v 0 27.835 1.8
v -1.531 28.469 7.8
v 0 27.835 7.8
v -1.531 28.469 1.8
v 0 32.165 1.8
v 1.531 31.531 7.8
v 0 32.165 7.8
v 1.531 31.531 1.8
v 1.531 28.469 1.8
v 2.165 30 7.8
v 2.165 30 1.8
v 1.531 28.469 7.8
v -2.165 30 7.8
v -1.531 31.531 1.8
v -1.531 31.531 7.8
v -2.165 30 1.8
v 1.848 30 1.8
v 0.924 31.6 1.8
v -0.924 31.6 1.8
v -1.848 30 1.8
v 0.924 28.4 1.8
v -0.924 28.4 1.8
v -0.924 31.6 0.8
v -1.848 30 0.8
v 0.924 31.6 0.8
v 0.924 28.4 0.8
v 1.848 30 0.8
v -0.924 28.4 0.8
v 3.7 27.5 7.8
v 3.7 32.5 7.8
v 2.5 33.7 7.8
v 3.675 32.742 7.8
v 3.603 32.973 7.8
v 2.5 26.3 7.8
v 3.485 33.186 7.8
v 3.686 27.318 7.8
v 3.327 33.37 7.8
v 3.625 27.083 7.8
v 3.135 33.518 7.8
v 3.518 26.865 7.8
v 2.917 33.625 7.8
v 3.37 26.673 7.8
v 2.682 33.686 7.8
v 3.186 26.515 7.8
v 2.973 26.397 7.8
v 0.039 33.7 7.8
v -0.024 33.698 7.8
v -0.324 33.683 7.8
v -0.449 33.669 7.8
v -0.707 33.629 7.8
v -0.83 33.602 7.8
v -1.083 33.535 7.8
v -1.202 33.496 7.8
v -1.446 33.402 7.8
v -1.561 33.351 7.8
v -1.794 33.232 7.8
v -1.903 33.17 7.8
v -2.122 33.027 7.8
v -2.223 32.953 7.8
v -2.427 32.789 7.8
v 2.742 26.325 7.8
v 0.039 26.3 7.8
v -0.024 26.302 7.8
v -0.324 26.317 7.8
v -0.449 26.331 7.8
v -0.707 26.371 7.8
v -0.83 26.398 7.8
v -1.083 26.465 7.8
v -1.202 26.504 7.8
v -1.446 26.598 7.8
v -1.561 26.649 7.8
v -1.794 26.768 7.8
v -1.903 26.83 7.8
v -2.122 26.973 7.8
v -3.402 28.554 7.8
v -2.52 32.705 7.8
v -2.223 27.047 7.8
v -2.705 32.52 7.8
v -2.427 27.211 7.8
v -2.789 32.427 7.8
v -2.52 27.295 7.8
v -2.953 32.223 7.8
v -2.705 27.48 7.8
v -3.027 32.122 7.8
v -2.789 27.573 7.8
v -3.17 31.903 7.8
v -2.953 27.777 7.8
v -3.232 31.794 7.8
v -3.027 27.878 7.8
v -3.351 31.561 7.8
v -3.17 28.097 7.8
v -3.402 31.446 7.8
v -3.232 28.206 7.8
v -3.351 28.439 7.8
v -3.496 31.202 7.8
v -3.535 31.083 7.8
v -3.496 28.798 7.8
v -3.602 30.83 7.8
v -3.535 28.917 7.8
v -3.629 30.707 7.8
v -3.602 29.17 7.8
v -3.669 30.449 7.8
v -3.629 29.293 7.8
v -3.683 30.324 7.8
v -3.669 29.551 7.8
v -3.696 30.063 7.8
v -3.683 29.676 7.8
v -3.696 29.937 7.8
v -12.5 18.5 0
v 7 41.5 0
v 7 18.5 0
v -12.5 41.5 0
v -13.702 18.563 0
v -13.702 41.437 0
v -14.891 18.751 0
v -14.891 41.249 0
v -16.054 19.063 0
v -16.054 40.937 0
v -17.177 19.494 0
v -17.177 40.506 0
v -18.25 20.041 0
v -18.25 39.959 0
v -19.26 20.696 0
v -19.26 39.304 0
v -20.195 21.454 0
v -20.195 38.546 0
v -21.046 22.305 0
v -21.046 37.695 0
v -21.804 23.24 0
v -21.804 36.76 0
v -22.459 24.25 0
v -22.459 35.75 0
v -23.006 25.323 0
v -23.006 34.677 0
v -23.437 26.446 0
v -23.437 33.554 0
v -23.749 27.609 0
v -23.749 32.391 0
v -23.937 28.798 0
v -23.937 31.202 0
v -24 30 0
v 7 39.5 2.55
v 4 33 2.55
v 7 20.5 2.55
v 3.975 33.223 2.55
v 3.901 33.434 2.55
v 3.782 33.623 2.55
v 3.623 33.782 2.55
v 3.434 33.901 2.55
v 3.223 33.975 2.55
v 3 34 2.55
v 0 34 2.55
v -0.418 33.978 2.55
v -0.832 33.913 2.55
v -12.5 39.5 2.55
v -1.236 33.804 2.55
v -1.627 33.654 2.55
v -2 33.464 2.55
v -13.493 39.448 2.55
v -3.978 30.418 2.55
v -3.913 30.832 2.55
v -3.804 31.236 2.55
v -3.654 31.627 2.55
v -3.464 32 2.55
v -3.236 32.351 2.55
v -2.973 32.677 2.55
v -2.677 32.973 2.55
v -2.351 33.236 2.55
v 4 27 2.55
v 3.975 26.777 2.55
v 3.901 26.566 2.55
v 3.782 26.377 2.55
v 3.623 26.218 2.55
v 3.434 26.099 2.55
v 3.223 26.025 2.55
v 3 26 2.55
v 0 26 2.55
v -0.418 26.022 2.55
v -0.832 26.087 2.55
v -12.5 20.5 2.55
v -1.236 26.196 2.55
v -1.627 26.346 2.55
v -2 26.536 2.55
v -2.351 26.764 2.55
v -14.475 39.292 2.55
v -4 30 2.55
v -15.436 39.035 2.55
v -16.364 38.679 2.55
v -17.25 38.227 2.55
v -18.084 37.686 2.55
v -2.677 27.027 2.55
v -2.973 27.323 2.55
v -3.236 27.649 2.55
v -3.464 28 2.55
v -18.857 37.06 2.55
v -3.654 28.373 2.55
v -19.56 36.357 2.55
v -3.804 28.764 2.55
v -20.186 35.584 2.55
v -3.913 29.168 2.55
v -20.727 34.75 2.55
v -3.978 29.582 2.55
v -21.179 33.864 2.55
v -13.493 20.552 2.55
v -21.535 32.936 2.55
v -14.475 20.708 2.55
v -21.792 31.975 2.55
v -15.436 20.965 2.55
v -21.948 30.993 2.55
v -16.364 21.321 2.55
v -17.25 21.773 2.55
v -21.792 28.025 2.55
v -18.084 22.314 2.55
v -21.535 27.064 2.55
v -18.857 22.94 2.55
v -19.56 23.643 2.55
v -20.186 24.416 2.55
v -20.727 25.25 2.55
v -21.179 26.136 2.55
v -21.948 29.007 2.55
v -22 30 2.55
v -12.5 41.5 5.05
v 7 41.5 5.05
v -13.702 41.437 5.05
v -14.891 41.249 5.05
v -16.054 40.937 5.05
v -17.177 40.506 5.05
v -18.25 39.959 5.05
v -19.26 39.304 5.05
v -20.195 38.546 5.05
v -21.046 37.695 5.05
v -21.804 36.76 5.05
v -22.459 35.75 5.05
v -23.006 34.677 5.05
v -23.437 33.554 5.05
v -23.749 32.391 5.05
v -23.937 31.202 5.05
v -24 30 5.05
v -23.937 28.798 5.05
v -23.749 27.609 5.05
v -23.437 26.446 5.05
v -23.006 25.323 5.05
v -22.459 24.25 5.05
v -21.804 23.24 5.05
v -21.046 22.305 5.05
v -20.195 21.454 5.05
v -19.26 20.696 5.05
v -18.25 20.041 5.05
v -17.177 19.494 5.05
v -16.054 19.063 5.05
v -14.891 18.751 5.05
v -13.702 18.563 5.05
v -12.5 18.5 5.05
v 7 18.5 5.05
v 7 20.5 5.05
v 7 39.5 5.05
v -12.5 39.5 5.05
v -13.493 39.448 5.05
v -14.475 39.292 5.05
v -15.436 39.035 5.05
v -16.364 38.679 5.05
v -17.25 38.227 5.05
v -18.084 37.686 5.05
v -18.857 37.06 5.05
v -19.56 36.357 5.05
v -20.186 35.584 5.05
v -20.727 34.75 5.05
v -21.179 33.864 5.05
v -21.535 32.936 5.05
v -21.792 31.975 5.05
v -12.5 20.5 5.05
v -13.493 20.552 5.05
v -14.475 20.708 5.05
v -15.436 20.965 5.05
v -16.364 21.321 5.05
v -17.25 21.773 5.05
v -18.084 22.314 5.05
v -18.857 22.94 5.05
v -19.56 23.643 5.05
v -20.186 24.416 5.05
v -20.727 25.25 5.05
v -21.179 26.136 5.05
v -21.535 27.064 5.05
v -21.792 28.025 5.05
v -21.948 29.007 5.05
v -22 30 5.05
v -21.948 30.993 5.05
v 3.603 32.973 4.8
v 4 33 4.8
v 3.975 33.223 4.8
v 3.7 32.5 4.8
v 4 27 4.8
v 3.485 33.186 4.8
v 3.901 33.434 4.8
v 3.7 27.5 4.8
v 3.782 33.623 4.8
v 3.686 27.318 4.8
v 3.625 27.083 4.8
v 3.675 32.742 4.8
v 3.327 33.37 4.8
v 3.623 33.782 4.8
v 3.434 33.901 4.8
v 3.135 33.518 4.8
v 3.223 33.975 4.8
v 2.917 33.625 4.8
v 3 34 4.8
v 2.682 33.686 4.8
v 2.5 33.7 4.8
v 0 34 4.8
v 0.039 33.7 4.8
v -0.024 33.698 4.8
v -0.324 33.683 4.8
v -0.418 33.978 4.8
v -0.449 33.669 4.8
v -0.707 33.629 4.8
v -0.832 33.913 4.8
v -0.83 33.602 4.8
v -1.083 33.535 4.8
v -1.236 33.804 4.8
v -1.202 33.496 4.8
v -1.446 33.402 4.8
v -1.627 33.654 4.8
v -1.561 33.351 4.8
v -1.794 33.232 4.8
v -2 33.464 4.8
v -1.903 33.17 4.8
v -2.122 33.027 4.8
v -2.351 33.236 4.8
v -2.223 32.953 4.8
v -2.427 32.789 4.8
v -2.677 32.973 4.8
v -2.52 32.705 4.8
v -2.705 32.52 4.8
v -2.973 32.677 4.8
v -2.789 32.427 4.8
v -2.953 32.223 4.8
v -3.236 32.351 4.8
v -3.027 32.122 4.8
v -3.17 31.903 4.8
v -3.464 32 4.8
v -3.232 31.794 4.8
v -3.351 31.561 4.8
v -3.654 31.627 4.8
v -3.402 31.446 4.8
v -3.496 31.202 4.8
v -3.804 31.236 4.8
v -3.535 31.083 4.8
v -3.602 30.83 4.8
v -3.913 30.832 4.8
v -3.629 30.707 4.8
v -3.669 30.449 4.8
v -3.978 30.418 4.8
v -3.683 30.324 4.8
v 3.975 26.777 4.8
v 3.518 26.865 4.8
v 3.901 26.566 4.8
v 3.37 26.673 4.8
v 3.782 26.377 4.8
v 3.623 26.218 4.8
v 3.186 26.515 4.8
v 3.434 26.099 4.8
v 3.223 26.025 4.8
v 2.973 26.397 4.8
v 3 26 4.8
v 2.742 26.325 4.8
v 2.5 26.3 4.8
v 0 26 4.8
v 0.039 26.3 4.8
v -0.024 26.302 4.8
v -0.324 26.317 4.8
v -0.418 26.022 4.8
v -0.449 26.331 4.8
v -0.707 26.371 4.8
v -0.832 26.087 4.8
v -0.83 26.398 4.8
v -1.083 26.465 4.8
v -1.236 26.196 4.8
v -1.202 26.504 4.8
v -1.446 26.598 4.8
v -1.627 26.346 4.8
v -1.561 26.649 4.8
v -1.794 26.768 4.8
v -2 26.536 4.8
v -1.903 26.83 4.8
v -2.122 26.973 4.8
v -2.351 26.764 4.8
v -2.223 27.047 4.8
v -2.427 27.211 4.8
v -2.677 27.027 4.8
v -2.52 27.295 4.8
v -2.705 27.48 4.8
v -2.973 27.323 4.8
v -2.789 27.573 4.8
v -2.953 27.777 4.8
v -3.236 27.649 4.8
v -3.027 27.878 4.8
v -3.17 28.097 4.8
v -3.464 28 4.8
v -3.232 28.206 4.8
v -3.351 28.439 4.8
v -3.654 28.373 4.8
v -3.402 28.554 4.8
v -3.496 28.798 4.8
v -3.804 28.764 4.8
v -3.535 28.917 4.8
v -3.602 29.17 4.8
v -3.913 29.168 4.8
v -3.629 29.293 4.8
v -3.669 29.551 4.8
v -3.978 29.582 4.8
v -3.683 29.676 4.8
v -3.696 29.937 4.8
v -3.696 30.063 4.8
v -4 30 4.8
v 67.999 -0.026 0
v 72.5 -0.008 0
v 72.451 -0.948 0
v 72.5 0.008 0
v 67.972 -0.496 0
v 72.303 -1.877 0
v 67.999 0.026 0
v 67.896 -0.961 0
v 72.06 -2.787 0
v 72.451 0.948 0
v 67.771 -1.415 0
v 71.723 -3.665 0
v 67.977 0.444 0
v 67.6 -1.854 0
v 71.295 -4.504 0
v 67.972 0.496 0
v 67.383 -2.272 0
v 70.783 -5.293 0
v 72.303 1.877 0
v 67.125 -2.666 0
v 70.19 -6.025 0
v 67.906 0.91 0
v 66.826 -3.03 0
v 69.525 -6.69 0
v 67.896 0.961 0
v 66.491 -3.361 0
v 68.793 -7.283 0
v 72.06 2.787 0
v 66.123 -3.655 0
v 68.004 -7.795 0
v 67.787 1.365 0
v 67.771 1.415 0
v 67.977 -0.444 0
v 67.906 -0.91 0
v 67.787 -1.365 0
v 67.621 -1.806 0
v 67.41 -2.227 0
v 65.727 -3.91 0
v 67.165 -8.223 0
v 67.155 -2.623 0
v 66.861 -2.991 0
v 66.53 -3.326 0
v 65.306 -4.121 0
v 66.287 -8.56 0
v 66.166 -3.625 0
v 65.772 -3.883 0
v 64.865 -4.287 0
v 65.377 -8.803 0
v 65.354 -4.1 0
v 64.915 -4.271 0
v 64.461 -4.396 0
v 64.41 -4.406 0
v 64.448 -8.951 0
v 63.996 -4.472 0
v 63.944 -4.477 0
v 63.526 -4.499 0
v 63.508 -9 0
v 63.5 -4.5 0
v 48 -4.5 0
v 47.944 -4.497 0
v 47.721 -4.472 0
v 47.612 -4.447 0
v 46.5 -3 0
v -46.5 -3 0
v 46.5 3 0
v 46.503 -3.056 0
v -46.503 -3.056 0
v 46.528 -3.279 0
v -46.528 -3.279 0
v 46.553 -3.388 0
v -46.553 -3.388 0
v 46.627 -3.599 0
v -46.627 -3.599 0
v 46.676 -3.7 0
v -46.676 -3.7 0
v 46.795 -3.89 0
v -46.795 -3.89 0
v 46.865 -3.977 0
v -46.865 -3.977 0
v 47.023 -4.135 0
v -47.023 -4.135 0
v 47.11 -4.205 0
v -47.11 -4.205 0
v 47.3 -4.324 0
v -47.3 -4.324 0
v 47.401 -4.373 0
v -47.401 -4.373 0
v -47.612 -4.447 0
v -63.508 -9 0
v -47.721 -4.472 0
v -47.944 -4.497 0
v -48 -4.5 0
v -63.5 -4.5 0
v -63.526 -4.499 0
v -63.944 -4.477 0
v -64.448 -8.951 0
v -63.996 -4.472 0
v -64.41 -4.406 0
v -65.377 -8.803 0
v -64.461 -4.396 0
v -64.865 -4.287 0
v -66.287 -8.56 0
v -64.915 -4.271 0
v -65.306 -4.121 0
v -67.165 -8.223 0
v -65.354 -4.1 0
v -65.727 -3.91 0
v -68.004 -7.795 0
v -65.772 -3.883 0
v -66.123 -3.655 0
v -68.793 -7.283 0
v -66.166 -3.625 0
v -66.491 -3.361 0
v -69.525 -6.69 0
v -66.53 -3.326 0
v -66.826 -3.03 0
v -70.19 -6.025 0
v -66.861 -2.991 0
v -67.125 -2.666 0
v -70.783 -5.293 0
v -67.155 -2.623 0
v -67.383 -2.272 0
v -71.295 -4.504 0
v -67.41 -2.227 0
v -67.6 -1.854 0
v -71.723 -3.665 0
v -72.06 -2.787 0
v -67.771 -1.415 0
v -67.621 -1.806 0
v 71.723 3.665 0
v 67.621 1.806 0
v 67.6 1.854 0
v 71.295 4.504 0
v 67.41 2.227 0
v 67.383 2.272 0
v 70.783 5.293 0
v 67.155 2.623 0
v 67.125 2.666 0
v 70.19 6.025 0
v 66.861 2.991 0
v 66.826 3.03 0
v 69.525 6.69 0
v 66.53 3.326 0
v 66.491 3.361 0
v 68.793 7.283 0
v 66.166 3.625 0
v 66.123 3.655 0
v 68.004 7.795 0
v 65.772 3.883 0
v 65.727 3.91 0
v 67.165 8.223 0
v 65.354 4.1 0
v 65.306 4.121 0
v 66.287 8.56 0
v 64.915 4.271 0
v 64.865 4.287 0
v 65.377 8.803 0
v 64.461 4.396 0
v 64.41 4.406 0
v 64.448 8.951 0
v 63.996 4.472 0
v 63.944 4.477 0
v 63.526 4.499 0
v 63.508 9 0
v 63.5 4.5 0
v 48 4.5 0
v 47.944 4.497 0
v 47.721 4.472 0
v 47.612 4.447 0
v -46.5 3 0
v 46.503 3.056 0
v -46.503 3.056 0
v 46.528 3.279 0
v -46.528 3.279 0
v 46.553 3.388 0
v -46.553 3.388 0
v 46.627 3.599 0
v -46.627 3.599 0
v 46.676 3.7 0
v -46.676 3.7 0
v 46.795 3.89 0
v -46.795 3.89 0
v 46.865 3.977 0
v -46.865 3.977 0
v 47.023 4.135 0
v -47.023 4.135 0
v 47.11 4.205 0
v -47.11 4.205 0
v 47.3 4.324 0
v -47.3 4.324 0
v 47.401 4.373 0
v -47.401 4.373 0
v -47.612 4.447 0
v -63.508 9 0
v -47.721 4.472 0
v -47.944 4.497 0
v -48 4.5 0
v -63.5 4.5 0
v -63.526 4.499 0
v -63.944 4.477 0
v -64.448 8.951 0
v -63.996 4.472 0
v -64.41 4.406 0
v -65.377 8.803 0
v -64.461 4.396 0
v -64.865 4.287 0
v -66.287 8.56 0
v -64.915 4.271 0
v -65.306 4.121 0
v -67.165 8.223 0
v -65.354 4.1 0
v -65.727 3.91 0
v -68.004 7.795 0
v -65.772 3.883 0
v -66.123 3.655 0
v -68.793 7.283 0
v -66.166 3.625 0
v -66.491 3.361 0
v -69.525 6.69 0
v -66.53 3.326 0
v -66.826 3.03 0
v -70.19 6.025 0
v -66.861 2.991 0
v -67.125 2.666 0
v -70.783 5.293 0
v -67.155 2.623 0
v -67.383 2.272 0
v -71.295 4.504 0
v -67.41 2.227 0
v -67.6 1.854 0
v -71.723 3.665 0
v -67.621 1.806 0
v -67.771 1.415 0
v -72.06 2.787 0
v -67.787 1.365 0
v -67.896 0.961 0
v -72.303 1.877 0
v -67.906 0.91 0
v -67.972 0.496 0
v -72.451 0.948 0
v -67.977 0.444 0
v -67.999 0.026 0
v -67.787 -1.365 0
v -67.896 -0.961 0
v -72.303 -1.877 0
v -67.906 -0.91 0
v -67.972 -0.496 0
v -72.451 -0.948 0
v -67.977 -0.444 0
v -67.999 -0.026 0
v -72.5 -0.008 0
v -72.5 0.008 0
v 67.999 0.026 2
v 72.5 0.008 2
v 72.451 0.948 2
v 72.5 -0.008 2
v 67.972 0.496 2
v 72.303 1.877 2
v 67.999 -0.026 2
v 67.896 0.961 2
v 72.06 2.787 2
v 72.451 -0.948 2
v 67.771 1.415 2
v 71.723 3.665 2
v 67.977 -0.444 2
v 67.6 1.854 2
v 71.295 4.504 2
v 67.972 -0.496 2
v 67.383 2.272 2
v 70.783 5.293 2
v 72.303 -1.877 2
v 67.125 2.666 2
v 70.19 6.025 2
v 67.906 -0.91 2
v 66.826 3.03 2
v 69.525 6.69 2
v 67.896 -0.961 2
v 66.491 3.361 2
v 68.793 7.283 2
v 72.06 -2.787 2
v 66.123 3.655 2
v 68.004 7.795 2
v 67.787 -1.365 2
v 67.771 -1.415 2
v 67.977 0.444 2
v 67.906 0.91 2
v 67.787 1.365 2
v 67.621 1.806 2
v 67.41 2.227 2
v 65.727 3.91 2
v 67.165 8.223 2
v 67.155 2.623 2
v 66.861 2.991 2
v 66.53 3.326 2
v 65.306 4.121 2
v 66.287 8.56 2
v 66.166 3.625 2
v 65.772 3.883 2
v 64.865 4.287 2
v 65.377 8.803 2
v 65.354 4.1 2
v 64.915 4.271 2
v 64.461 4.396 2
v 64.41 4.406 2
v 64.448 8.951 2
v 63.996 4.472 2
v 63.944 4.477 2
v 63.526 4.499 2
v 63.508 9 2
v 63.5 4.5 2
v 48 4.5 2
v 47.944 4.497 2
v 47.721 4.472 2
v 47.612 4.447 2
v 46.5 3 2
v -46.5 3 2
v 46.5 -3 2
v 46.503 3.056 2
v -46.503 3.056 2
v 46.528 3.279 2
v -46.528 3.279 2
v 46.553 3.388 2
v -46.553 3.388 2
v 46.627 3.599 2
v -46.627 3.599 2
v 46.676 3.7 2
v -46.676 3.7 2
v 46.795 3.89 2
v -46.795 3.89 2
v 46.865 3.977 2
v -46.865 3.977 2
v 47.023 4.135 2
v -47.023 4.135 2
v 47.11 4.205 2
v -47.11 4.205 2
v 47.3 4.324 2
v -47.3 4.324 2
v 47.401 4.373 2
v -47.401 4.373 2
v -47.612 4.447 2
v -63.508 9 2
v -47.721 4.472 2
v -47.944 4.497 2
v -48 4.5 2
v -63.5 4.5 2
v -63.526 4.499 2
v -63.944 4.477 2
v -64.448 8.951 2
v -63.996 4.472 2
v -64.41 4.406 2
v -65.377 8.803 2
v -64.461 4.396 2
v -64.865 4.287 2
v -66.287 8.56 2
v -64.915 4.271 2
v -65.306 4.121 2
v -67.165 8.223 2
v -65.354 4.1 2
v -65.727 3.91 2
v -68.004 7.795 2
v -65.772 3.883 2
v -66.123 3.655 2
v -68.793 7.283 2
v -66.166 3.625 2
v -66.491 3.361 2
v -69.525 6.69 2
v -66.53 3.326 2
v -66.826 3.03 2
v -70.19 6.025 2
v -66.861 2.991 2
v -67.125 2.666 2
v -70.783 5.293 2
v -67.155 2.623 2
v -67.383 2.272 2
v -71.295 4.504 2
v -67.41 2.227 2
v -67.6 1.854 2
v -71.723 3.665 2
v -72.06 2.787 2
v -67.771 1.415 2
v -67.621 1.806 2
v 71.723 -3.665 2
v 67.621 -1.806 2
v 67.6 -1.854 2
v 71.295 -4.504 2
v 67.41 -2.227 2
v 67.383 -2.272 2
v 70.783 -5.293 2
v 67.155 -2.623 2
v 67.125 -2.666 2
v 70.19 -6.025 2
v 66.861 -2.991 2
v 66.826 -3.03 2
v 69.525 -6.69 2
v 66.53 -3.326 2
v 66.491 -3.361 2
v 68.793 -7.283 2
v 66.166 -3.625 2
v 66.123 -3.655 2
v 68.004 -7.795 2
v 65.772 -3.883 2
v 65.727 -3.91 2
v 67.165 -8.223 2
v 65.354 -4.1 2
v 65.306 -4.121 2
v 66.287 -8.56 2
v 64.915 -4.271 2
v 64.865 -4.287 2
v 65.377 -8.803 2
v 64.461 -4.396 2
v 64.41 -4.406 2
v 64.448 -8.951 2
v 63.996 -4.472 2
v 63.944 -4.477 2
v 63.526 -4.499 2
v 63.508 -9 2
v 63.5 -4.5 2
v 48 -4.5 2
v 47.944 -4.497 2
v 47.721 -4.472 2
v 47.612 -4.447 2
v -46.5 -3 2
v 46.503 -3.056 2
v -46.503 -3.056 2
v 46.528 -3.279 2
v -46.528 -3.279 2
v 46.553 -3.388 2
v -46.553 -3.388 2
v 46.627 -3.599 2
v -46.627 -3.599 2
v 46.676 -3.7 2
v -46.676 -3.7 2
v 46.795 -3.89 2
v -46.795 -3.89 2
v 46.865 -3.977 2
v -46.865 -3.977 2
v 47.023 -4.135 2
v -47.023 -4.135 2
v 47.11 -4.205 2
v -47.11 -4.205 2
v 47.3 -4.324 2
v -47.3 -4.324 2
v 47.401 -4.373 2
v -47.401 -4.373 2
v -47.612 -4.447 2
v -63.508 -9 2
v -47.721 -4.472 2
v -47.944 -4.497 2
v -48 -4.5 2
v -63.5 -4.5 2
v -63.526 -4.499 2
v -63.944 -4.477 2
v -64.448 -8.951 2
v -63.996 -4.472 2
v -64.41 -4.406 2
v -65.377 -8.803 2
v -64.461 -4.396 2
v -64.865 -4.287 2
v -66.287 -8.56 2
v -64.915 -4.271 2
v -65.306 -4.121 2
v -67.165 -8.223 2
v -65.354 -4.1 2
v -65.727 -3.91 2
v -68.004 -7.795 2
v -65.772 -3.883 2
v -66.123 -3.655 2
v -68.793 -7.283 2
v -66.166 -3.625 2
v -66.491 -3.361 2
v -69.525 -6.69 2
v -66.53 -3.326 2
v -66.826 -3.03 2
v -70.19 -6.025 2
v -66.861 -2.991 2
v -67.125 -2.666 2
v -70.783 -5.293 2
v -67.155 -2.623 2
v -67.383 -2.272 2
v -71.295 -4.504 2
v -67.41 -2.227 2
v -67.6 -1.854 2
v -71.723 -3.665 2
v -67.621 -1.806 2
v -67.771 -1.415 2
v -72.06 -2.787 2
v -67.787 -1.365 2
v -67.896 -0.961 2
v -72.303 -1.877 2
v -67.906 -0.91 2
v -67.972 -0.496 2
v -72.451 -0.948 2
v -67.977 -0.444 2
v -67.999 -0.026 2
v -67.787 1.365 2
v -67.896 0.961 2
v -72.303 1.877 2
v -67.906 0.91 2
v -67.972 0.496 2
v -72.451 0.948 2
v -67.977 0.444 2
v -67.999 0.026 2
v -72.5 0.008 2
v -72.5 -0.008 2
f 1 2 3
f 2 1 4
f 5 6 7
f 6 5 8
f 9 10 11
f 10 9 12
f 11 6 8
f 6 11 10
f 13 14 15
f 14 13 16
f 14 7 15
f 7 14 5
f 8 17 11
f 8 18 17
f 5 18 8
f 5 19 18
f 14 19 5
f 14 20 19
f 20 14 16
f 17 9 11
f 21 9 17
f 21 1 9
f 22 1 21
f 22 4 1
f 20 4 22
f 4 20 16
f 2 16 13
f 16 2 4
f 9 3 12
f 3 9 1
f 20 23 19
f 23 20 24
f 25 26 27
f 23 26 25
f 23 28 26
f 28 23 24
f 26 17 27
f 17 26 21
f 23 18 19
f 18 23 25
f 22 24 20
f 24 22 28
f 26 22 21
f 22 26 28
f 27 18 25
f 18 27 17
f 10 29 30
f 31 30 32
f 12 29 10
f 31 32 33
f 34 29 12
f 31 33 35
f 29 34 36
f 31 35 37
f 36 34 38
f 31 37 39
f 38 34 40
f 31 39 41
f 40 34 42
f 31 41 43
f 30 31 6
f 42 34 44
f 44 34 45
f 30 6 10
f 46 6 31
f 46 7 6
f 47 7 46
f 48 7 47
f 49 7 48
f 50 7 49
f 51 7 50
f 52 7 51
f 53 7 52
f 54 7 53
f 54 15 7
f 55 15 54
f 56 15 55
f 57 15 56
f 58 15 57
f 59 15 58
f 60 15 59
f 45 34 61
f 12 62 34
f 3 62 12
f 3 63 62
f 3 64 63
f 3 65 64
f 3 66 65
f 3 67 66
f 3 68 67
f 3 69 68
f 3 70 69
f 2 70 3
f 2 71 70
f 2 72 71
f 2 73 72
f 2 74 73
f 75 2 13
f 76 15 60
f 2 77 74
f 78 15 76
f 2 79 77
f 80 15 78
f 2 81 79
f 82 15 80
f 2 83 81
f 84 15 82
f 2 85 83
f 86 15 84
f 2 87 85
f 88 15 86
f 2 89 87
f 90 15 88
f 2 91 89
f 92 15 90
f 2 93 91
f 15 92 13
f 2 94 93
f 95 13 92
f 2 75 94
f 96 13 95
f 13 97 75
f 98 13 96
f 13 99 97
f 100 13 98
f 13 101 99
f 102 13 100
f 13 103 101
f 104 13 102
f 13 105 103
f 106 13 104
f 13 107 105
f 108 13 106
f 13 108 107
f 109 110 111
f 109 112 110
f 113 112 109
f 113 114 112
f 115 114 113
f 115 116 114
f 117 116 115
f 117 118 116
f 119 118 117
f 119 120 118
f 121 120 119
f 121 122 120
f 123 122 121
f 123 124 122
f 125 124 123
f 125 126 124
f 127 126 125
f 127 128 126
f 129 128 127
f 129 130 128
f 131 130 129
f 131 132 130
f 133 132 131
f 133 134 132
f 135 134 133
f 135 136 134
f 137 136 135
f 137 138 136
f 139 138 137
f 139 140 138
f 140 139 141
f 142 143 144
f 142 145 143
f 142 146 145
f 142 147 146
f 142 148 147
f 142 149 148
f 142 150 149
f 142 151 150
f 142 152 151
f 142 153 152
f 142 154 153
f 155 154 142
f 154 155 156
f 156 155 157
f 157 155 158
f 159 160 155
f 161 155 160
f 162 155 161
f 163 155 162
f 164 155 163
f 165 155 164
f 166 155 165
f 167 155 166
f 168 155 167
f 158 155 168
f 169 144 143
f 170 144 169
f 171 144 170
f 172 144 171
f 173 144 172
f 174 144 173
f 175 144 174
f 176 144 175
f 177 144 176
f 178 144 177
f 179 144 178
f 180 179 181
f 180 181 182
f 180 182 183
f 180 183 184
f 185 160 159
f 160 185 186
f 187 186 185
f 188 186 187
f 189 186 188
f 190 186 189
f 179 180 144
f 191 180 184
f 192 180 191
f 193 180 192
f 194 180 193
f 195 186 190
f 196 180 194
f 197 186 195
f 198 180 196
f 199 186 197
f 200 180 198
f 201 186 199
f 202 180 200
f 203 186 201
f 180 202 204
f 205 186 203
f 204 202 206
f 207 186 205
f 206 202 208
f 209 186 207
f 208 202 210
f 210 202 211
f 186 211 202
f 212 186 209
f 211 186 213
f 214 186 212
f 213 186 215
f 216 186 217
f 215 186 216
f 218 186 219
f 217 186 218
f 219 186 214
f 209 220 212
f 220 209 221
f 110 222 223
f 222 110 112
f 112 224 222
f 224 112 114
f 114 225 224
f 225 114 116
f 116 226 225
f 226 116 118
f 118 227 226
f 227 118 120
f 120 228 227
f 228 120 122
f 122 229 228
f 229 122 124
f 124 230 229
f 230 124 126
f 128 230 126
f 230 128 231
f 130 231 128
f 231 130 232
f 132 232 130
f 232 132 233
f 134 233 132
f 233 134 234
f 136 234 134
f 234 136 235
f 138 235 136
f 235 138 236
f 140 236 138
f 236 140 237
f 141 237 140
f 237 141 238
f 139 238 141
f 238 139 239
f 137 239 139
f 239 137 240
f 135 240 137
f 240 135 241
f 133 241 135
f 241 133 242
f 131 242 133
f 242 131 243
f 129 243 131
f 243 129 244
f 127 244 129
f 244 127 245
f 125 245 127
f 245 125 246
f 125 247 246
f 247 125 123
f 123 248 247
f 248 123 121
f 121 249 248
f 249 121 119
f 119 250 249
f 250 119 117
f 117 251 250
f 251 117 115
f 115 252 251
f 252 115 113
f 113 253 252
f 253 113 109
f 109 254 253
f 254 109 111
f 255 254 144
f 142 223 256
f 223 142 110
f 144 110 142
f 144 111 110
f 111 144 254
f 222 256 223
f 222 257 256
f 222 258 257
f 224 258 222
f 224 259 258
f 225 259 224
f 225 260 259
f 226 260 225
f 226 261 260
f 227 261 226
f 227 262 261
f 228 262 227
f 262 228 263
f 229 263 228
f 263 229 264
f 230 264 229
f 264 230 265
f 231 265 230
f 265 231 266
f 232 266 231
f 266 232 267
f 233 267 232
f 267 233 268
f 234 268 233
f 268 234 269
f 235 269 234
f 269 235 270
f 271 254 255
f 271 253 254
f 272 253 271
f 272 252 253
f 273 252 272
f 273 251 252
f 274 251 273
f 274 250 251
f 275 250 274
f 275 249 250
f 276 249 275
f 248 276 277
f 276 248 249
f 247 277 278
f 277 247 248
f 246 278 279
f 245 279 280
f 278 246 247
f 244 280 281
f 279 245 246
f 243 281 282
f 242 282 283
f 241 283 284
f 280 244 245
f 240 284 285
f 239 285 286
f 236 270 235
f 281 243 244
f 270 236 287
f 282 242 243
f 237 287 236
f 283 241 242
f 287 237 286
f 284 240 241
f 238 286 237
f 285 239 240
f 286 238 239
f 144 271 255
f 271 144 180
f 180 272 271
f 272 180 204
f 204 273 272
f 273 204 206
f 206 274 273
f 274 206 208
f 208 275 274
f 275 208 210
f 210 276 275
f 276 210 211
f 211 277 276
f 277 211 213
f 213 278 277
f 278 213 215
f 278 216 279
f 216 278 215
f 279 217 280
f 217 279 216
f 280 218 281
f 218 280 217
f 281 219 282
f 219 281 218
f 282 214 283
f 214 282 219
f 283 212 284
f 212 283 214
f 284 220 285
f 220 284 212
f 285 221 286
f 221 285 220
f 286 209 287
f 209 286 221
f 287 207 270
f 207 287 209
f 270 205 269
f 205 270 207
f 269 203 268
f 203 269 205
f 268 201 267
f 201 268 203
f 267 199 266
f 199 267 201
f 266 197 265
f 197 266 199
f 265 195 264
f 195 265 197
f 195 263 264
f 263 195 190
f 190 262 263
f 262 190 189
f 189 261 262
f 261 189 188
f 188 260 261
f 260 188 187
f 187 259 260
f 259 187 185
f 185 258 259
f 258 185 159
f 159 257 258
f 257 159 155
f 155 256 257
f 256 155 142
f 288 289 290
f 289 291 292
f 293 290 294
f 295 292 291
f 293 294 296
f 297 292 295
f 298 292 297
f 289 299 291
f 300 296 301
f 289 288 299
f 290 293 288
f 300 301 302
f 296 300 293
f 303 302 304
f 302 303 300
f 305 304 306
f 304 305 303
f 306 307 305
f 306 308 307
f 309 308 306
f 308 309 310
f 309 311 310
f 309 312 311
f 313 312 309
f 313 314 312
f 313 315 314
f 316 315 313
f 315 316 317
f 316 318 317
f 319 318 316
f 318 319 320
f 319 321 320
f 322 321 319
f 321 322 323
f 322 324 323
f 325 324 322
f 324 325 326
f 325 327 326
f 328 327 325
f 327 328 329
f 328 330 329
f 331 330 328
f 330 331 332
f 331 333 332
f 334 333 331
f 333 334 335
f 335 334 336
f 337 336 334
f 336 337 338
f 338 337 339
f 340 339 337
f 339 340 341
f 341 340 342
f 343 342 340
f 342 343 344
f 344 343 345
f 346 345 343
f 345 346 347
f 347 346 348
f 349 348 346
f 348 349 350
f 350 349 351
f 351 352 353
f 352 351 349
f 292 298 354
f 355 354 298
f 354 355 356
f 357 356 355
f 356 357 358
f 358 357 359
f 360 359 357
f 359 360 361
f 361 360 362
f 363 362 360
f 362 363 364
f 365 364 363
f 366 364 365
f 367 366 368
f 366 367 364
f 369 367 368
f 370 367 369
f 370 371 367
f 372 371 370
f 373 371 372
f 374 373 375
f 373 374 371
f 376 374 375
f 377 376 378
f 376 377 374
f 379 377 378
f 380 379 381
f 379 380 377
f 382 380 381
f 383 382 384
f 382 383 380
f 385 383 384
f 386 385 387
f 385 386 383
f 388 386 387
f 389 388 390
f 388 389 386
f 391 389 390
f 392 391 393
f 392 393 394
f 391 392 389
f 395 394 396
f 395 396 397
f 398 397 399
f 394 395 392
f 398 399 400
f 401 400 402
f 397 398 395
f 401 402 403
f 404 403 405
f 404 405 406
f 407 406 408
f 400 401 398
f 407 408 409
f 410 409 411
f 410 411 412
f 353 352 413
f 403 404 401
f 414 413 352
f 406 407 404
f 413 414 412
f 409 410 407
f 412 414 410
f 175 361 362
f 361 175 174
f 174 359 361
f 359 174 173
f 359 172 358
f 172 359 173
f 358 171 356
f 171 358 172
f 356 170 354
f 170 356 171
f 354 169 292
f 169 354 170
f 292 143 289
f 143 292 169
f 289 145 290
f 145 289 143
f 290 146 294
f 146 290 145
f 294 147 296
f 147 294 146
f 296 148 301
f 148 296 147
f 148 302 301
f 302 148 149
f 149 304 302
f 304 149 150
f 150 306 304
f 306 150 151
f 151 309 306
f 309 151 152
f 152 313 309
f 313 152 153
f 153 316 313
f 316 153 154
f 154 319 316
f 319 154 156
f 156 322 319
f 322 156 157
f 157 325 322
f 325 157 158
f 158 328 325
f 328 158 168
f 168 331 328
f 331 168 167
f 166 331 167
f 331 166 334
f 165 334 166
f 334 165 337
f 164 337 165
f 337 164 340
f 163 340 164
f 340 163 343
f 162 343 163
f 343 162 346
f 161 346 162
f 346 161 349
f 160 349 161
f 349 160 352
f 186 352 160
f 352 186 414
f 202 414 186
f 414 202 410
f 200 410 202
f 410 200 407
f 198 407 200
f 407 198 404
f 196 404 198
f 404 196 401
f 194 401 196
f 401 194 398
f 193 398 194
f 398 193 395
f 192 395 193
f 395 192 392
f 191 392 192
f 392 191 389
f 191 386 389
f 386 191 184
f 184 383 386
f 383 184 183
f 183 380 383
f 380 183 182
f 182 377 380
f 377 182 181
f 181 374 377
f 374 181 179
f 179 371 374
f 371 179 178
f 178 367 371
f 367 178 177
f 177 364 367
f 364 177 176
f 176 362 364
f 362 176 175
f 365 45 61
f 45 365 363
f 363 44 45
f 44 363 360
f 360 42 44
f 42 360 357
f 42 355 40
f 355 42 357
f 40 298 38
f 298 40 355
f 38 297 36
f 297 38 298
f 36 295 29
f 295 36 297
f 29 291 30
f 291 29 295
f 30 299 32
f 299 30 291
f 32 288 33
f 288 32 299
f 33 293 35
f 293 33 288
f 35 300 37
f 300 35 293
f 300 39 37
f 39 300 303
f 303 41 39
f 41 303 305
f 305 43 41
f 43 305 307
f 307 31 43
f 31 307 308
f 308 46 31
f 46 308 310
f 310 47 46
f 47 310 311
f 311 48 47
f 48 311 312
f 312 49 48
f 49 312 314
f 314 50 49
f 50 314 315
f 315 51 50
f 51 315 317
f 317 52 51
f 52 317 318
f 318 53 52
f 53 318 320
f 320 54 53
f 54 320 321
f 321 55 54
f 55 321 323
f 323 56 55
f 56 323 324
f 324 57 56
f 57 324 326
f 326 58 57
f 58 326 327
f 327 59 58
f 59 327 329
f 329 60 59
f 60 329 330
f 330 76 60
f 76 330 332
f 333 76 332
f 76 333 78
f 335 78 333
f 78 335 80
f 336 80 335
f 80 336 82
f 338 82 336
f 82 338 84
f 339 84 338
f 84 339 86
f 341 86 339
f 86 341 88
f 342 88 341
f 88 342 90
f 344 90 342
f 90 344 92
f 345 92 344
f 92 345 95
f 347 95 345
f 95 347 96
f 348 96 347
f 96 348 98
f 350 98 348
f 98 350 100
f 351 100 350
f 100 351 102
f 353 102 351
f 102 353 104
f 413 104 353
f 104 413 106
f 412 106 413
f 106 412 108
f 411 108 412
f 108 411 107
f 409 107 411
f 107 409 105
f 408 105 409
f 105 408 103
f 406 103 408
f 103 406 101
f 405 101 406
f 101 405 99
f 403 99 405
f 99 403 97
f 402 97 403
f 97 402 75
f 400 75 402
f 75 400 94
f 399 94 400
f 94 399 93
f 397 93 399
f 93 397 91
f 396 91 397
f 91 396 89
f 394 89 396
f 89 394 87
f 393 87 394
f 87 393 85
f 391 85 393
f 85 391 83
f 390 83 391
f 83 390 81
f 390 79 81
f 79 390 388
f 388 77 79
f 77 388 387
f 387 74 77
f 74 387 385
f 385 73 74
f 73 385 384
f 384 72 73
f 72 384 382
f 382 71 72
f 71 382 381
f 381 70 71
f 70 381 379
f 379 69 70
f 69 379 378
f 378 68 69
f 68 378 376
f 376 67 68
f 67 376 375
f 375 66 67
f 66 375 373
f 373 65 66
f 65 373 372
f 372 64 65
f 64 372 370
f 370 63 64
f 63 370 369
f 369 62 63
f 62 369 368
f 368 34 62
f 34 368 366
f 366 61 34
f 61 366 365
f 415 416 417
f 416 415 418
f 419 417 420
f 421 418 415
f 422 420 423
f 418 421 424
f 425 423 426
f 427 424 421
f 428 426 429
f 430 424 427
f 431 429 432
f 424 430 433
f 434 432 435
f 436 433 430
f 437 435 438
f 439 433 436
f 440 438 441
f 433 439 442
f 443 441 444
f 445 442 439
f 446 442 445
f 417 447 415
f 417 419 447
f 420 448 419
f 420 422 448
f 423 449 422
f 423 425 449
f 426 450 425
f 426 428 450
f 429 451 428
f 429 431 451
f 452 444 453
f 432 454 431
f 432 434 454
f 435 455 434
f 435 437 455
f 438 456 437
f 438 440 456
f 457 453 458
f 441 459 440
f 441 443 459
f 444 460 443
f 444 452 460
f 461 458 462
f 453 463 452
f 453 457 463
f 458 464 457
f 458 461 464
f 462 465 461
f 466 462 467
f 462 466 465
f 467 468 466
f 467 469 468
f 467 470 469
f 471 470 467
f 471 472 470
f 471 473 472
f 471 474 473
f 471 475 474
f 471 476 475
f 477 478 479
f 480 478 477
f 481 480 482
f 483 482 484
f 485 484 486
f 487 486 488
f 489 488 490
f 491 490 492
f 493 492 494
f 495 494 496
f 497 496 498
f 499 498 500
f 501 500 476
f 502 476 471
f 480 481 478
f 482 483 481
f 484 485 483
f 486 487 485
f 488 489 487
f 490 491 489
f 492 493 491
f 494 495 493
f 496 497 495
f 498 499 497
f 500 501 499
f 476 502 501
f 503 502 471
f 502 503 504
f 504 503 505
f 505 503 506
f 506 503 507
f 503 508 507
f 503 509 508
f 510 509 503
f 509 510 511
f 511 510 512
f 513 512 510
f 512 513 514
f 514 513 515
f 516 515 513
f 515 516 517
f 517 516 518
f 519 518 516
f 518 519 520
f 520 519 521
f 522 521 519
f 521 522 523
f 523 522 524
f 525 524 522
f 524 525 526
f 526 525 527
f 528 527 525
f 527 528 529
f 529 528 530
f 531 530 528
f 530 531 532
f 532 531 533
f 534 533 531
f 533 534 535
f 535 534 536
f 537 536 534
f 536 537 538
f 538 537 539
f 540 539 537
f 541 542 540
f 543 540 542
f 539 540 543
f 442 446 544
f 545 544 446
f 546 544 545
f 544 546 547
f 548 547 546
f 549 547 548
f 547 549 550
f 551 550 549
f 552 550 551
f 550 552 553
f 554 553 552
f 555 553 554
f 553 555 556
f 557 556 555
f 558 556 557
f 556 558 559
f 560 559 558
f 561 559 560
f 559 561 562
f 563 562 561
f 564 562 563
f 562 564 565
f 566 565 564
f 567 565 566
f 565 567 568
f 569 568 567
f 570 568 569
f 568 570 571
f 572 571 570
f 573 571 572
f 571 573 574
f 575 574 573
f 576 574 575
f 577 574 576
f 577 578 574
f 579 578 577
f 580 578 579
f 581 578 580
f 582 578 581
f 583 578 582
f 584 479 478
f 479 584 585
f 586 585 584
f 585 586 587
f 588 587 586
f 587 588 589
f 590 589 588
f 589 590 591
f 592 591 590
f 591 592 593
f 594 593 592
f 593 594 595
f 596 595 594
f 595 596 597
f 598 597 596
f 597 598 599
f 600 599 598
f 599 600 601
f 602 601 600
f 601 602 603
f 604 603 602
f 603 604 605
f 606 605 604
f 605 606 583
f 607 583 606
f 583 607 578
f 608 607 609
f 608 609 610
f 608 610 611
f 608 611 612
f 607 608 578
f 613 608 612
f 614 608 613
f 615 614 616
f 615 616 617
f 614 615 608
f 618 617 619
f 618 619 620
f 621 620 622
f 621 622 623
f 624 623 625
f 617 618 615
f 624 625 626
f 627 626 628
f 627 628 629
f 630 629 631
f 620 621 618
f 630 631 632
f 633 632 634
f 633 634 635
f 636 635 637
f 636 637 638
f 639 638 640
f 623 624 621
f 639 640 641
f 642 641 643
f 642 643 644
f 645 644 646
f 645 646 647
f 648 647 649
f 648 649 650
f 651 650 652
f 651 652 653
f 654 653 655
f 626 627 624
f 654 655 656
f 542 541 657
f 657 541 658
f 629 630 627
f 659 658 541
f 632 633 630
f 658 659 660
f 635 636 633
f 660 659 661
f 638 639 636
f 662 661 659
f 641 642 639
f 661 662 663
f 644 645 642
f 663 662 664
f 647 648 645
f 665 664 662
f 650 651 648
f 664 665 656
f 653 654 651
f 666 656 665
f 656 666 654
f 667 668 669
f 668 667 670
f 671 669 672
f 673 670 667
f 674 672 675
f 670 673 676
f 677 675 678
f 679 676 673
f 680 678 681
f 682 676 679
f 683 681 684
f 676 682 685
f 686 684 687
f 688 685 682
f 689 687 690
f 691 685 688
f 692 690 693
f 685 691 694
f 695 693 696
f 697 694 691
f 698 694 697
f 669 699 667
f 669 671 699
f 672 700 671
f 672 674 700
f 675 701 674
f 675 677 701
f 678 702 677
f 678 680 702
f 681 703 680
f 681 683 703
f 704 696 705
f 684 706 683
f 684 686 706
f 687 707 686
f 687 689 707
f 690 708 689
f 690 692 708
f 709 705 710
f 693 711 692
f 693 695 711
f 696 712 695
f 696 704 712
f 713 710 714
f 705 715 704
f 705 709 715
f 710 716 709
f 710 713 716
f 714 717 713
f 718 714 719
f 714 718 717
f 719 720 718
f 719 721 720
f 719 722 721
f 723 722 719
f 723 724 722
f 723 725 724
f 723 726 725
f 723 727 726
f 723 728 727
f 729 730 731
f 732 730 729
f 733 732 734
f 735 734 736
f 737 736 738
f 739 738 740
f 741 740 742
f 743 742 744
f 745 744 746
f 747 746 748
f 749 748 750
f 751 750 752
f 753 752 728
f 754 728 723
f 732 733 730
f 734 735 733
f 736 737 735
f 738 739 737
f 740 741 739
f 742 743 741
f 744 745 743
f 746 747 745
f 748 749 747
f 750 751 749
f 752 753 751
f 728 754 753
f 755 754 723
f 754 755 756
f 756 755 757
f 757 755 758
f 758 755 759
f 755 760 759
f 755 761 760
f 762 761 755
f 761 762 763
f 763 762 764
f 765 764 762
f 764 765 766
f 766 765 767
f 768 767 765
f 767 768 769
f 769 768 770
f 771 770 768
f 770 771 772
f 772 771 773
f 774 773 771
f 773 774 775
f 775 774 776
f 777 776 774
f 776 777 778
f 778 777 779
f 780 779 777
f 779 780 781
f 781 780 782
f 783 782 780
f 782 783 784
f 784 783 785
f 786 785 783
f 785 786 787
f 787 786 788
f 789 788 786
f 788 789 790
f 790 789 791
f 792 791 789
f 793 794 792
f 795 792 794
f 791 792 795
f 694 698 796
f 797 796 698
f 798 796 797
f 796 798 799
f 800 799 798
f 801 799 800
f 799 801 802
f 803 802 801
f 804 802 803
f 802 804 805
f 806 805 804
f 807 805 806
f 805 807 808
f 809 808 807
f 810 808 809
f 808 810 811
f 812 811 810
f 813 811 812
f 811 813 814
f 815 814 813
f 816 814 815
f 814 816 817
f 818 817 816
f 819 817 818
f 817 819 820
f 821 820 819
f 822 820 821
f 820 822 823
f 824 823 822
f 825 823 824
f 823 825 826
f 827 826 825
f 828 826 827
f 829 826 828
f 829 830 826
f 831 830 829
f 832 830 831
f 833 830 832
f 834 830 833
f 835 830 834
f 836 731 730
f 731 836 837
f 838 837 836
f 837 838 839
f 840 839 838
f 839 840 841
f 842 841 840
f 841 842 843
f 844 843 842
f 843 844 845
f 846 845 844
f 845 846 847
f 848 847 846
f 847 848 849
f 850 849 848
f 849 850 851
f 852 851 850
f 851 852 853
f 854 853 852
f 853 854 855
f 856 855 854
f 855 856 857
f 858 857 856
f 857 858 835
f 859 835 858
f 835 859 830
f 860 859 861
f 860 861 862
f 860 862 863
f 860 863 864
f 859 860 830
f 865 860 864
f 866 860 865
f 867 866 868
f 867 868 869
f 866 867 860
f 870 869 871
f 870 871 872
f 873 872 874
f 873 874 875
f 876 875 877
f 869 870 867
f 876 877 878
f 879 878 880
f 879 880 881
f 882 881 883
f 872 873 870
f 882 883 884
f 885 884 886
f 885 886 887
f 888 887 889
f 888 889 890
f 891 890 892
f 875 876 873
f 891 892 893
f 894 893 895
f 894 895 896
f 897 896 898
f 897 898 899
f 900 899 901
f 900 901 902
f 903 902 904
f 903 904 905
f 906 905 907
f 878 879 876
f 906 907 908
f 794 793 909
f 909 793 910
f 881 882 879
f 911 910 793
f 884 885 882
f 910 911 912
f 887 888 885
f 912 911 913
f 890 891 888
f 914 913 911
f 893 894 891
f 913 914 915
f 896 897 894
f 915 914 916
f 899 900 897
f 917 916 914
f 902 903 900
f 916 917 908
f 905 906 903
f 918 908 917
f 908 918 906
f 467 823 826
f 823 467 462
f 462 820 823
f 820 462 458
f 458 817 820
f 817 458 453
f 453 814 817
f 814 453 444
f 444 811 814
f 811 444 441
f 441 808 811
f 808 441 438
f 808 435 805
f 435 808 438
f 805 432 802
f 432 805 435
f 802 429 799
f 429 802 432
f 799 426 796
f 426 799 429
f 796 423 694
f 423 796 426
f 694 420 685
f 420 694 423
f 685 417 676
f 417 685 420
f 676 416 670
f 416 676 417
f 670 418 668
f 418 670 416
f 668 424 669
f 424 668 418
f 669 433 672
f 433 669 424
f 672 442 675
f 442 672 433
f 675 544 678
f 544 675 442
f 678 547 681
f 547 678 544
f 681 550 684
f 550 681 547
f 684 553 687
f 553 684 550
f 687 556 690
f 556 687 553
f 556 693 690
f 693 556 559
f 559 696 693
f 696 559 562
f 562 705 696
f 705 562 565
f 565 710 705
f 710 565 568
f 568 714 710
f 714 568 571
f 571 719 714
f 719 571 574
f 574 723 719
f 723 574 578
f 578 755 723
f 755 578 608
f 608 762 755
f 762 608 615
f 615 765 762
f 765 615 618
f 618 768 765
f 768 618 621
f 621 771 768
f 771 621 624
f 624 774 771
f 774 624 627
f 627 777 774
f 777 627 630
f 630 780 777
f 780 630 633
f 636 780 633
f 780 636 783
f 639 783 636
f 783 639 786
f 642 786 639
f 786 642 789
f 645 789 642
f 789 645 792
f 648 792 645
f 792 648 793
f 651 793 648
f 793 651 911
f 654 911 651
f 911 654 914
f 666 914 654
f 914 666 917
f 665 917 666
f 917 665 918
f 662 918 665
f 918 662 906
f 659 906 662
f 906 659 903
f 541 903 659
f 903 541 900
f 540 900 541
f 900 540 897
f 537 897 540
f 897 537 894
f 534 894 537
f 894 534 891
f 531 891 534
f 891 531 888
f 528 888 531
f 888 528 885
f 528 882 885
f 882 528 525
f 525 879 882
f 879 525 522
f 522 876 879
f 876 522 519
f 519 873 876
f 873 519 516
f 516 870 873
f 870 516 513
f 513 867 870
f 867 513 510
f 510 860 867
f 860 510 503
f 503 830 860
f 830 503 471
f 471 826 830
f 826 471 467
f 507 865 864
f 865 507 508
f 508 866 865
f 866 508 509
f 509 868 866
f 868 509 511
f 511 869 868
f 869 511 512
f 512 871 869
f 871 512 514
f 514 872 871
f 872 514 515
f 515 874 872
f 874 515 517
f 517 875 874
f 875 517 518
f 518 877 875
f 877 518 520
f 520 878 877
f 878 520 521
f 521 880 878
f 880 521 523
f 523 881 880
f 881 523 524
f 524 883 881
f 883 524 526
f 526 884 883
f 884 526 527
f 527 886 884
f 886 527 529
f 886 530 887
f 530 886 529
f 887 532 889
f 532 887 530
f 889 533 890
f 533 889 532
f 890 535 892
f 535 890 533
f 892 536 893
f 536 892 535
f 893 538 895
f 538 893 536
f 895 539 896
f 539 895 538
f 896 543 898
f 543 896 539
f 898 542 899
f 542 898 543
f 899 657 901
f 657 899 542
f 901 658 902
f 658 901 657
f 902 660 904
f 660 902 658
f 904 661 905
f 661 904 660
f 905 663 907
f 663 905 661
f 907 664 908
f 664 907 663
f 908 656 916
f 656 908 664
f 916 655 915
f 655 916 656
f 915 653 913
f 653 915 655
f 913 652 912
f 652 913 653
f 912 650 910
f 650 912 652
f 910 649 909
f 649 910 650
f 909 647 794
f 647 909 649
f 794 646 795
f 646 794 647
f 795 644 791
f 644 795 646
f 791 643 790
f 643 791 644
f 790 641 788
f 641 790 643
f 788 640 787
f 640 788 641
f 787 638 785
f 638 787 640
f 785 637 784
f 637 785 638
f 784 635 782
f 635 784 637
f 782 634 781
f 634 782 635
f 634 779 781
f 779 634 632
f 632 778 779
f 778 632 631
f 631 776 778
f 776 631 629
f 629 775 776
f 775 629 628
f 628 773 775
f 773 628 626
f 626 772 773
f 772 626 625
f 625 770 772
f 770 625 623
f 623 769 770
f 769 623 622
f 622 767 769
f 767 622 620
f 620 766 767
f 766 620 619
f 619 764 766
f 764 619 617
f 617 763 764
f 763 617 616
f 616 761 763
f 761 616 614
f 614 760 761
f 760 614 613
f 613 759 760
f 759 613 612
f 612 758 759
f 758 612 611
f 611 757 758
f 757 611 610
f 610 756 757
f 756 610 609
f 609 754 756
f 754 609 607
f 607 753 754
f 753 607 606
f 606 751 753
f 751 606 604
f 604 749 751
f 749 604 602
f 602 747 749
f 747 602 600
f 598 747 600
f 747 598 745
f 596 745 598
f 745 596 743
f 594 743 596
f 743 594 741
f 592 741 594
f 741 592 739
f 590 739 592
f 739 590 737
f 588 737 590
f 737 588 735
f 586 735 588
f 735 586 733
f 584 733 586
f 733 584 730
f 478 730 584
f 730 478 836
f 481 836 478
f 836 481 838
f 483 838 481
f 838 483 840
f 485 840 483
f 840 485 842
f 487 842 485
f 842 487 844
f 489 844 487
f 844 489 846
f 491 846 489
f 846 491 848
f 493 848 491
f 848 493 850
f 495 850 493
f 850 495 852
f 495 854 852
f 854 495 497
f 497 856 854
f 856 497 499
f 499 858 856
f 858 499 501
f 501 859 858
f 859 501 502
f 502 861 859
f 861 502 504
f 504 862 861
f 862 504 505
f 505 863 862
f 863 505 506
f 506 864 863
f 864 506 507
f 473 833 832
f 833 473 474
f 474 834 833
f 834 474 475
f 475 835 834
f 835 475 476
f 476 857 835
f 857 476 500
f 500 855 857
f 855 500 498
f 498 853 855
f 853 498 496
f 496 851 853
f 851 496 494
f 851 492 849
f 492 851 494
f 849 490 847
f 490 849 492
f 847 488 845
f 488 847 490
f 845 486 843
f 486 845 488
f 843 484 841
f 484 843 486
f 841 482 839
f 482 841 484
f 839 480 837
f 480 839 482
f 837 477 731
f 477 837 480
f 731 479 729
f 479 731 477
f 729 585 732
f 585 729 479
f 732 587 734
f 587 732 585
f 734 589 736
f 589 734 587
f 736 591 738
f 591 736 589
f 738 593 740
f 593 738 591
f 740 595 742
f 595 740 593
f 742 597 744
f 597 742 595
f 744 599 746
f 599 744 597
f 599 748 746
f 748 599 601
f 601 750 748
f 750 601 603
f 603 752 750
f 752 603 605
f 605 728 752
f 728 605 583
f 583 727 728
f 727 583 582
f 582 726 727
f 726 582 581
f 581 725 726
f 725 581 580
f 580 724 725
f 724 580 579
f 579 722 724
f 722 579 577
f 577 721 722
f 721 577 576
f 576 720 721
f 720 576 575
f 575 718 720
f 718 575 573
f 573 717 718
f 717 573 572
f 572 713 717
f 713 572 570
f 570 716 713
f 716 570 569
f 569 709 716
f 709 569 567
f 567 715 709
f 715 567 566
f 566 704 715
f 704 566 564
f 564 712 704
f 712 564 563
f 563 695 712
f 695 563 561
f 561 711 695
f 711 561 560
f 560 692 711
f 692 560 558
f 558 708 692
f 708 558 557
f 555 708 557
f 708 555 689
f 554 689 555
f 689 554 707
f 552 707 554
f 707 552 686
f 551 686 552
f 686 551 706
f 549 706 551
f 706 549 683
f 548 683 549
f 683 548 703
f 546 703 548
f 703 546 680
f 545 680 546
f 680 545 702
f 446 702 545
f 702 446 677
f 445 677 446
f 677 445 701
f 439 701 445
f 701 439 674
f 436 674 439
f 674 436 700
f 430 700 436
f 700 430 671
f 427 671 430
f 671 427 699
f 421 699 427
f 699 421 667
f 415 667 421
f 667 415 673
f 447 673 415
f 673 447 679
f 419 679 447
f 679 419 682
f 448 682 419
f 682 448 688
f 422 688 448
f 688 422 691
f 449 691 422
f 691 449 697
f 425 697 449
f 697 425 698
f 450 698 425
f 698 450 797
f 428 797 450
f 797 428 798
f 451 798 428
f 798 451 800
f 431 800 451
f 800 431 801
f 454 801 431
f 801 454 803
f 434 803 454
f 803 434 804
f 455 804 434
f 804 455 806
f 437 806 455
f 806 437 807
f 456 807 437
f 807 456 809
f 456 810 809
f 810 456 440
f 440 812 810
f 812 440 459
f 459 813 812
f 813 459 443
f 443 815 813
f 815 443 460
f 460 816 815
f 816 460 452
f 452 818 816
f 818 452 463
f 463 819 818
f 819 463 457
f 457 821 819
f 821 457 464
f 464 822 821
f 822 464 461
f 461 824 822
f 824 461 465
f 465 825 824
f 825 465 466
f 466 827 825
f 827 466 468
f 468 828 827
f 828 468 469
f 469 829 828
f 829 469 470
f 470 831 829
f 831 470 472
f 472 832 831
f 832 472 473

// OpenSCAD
//
// NopSCADlib Copyright Chris Palmer 2018
// nop.head@gmail.com
// hydraraptor.blogspot.com
//
// This file is part of NopSCADlib.
//
// NopSCADlib is free software: you can redistribute it and/or modify it under the terms of the
// GNU General Public License as published by the Free Software Foundation, either version 3 of
// the License, or (at your option) any later version.
//
// NopSCADlib is distributed in the hope that it will be useful, but WITHOUT ANY WARRANTY;
// without even the implied warranty of MERCHANTABILITY or FITNESS FOR A PARTICULAR PURPOSE.
// See the GNU General Public License for more details.
//
// You should have received a copy of the GNU General Public License along with NopSCADlib.
// If not, see <https://www.gnu.org/licenses/>.
//
include <../core.scad>
use <../strap_handle.scad>

length = 150;

module strap_handles()
    if($preview)
        strap_assembly(length);
    else {
        strap(length);

        translate([0, 30])
            strap_end();
    }

strap_handles();
